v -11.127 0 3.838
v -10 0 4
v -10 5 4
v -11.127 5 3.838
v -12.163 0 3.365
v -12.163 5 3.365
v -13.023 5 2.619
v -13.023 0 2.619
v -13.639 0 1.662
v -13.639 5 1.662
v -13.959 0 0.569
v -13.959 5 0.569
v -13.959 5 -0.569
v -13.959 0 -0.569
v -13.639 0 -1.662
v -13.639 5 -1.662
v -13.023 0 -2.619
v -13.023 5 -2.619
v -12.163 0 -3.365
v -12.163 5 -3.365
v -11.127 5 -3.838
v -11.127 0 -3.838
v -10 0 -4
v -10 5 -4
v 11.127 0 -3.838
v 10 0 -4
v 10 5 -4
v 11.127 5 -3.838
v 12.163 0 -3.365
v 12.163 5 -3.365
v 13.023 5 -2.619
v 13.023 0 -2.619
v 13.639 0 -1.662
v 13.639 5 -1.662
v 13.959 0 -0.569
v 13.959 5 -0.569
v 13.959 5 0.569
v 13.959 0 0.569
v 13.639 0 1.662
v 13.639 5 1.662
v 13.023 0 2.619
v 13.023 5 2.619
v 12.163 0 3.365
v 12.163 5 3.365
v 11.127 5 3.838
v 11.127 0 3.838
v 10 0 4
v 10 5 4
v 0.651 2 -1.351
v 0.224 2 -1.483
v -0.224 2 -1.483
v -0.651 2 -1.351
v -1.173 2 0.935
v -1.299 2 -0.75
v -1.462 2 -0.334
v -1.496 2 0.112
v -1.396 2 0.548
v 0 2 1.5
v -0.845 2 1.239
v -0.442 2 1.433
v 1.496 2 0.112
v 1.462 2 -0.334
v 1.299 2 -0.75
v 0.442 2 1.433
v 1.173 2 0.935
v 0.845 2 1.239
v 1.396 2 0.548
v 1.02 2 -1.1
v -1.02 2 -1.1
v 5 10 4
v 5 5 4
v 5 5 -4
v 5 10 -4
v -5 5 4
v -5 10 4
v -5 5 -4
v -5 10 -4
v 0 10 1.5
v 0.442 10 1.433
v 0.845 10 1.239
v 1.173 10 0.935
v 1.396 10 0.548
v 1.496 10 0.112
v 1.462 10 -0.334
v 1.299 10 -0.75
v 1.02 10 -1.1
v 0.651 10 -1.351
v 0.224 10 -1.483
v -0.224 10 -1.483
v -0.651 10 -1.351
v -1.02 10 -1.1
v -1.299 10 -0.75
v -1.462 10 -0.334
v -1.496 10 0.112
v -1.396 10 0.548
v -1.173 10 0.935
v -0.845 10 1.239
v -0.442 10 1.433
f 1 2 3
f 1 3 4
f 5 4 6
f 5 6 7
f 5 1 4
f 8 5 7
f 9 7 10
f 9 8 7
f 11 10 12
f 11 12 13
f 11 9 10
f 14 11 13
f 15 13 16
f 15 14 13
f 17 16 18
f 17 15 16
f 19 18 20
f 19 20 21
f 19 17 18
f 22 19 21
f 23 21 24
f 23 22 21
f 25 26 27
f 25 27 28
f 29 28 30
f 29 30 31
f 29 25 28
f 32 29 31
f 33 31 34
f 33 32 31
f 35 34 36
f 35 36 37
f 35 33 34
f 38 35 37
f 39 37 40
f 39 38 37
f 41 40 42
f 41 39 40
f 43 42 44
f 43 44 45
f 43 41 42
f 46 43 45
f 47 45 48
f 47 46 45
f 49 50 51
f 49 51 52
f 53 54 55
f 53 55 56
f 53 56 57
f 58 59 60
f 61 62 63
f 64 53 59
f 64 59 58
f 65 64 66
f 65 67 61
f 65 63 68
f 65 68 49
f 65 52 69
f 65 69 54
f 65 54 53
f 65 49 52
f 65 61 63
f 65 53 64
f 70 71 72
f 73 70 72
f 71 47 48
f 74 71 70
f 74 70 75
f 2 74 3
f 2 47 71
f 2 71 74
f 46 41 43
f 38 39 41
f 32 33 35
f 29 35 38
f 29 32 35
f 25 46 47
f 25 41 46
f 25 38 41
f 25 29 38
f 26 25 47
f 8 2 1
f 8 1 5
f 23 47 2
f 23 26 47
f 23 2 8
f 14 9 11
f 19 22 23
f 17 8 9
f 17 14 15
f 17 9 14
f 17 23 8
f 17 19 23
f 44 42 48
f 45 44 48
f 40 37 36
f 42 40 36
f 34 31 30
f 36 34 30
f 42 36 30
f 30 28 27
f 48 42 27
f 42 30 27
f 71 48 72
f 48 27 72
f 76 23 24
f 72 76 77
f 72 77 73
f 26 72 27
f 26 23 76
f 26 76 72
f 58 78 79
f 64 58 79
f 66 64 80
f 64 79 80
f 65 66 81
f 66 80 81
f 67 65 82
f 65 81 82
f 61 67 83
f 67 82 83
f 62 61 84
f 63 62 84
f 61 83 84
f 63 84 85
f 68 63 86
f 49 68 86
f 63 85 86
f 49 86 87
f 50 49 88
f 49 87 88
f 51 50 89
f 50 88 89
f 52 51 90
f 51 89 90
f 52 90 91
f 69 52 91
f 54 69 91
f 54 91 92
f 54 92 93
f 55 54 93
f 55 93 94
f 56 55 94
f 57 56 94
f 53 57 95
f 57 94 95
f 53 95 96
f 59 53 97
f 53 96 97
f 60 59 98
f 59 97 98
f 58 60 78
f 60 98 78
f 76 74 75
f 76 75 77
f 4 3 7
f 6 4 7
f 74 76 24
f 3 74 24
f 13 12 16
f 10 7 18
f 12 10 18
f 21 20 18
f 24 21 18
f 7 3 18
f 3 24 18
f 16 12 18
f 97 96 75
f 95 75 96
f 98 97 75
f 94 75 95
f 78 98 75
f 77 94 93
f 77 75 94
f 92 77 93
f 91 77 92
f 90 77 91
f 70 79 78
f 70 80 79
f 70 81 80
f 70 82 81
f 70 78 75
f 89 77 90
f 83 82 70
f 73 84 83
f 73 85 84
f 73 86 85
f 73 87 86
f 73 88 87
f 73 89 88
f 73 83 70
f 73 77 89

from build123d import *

# Parameters (mm, degrees)
BOSS_EXTRUDE1_DEPTH = 5
SKETCH2_W           = 10
SKETCH2_H           = 8
BOSS_EXTRUDE2_DEPTH = 5
SKETCH3_R           = 1.5
CUT_EXTRUDE1_DEPTH  = 8


with BuildPart() as part:
    # Sketch1 → Boss-Extrude1 (new body)
    with BuildSketch(Plane(origin=(0, 0, 0), x_dir=(1, 0, 0), z_dir=(0, 1, 0))):
        with BuildLine():
            Line((10, -4), (-10, -4))
            ThreePointArc((-10, -4), (-14, 0), (-10, 4))
            Line((-10, 4), (10, 4))
            ThreePointArc((10, 4), (14, 0), (10, -4))
        make_face()
    extrude(amount=BOSS_EXTRUDE1_DEPTH)

    # Sketch2 → Boss-Extrude2 (add)
    with BuildSketch(Plane(origin=(0, 5, 0), x_dir=(1, 0, 0), z_dir=(0, 1, 0))):
        Rectangle(SKETCH2_W, SKETCH2_H)
    extrude(amount=BOSS_EXTRUDE2_DEPTH)

    # Sketch3 → Cut-Extrude1 (cut)
    with BuildSketch(Plane(origin=(0, 10, 0), x_dir=(1, 0, 0), z_dir=(0, 1, 0))):
        with Locations(Location((0, 0, 0), (0, 0, 270))):  # turned: the seam where the file's is
            Circle(SKETCH3_R)
    extrude(amount=-CUT_EXTRUDE1_DEPTH, mode=Mode.SUBTRACT)


solid = part.part
